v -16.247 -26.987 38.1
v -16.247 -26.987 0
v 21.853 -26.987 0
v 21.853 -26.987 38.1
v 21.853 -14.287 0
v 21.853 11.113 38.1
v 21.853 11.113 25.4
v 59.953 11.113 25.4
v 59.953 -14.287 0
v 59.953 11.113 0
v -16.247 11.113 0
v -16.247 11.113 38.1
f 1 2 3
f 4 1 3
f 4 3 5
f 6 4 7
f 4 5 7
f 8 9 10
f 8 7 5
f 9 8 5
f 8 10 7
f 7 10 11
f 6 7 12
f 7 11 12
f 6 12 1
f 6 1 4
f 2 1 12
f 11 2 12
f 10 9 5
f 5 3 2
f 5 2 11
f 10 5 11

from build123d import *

# Parameters (mm, degrees)
F0_W     = 38.1
F0_H     = 38.1
F1_DEPTH = 38.1
F3_DEPTH = 38.1


with BuildPart() as f1:
    # F0 (on Top) → F1 (new body)
    with BuildSketch(Plane.XY):
        with Locations((2.80316, -7.937101)):
            Rectangle(F0_W, F0_H)
    extrude(amount=F1_DEPTH)

    # F2 (on face) → F3 (join)
    with BuildSketch(Plane.YZ.offset(21.85316)):
        Polygon((11.112899, 0), (11.112899, 25.4), (-14.287101, 0), align=None)
    extrude(amount=F3_DEPTH)


solid = f1.part
